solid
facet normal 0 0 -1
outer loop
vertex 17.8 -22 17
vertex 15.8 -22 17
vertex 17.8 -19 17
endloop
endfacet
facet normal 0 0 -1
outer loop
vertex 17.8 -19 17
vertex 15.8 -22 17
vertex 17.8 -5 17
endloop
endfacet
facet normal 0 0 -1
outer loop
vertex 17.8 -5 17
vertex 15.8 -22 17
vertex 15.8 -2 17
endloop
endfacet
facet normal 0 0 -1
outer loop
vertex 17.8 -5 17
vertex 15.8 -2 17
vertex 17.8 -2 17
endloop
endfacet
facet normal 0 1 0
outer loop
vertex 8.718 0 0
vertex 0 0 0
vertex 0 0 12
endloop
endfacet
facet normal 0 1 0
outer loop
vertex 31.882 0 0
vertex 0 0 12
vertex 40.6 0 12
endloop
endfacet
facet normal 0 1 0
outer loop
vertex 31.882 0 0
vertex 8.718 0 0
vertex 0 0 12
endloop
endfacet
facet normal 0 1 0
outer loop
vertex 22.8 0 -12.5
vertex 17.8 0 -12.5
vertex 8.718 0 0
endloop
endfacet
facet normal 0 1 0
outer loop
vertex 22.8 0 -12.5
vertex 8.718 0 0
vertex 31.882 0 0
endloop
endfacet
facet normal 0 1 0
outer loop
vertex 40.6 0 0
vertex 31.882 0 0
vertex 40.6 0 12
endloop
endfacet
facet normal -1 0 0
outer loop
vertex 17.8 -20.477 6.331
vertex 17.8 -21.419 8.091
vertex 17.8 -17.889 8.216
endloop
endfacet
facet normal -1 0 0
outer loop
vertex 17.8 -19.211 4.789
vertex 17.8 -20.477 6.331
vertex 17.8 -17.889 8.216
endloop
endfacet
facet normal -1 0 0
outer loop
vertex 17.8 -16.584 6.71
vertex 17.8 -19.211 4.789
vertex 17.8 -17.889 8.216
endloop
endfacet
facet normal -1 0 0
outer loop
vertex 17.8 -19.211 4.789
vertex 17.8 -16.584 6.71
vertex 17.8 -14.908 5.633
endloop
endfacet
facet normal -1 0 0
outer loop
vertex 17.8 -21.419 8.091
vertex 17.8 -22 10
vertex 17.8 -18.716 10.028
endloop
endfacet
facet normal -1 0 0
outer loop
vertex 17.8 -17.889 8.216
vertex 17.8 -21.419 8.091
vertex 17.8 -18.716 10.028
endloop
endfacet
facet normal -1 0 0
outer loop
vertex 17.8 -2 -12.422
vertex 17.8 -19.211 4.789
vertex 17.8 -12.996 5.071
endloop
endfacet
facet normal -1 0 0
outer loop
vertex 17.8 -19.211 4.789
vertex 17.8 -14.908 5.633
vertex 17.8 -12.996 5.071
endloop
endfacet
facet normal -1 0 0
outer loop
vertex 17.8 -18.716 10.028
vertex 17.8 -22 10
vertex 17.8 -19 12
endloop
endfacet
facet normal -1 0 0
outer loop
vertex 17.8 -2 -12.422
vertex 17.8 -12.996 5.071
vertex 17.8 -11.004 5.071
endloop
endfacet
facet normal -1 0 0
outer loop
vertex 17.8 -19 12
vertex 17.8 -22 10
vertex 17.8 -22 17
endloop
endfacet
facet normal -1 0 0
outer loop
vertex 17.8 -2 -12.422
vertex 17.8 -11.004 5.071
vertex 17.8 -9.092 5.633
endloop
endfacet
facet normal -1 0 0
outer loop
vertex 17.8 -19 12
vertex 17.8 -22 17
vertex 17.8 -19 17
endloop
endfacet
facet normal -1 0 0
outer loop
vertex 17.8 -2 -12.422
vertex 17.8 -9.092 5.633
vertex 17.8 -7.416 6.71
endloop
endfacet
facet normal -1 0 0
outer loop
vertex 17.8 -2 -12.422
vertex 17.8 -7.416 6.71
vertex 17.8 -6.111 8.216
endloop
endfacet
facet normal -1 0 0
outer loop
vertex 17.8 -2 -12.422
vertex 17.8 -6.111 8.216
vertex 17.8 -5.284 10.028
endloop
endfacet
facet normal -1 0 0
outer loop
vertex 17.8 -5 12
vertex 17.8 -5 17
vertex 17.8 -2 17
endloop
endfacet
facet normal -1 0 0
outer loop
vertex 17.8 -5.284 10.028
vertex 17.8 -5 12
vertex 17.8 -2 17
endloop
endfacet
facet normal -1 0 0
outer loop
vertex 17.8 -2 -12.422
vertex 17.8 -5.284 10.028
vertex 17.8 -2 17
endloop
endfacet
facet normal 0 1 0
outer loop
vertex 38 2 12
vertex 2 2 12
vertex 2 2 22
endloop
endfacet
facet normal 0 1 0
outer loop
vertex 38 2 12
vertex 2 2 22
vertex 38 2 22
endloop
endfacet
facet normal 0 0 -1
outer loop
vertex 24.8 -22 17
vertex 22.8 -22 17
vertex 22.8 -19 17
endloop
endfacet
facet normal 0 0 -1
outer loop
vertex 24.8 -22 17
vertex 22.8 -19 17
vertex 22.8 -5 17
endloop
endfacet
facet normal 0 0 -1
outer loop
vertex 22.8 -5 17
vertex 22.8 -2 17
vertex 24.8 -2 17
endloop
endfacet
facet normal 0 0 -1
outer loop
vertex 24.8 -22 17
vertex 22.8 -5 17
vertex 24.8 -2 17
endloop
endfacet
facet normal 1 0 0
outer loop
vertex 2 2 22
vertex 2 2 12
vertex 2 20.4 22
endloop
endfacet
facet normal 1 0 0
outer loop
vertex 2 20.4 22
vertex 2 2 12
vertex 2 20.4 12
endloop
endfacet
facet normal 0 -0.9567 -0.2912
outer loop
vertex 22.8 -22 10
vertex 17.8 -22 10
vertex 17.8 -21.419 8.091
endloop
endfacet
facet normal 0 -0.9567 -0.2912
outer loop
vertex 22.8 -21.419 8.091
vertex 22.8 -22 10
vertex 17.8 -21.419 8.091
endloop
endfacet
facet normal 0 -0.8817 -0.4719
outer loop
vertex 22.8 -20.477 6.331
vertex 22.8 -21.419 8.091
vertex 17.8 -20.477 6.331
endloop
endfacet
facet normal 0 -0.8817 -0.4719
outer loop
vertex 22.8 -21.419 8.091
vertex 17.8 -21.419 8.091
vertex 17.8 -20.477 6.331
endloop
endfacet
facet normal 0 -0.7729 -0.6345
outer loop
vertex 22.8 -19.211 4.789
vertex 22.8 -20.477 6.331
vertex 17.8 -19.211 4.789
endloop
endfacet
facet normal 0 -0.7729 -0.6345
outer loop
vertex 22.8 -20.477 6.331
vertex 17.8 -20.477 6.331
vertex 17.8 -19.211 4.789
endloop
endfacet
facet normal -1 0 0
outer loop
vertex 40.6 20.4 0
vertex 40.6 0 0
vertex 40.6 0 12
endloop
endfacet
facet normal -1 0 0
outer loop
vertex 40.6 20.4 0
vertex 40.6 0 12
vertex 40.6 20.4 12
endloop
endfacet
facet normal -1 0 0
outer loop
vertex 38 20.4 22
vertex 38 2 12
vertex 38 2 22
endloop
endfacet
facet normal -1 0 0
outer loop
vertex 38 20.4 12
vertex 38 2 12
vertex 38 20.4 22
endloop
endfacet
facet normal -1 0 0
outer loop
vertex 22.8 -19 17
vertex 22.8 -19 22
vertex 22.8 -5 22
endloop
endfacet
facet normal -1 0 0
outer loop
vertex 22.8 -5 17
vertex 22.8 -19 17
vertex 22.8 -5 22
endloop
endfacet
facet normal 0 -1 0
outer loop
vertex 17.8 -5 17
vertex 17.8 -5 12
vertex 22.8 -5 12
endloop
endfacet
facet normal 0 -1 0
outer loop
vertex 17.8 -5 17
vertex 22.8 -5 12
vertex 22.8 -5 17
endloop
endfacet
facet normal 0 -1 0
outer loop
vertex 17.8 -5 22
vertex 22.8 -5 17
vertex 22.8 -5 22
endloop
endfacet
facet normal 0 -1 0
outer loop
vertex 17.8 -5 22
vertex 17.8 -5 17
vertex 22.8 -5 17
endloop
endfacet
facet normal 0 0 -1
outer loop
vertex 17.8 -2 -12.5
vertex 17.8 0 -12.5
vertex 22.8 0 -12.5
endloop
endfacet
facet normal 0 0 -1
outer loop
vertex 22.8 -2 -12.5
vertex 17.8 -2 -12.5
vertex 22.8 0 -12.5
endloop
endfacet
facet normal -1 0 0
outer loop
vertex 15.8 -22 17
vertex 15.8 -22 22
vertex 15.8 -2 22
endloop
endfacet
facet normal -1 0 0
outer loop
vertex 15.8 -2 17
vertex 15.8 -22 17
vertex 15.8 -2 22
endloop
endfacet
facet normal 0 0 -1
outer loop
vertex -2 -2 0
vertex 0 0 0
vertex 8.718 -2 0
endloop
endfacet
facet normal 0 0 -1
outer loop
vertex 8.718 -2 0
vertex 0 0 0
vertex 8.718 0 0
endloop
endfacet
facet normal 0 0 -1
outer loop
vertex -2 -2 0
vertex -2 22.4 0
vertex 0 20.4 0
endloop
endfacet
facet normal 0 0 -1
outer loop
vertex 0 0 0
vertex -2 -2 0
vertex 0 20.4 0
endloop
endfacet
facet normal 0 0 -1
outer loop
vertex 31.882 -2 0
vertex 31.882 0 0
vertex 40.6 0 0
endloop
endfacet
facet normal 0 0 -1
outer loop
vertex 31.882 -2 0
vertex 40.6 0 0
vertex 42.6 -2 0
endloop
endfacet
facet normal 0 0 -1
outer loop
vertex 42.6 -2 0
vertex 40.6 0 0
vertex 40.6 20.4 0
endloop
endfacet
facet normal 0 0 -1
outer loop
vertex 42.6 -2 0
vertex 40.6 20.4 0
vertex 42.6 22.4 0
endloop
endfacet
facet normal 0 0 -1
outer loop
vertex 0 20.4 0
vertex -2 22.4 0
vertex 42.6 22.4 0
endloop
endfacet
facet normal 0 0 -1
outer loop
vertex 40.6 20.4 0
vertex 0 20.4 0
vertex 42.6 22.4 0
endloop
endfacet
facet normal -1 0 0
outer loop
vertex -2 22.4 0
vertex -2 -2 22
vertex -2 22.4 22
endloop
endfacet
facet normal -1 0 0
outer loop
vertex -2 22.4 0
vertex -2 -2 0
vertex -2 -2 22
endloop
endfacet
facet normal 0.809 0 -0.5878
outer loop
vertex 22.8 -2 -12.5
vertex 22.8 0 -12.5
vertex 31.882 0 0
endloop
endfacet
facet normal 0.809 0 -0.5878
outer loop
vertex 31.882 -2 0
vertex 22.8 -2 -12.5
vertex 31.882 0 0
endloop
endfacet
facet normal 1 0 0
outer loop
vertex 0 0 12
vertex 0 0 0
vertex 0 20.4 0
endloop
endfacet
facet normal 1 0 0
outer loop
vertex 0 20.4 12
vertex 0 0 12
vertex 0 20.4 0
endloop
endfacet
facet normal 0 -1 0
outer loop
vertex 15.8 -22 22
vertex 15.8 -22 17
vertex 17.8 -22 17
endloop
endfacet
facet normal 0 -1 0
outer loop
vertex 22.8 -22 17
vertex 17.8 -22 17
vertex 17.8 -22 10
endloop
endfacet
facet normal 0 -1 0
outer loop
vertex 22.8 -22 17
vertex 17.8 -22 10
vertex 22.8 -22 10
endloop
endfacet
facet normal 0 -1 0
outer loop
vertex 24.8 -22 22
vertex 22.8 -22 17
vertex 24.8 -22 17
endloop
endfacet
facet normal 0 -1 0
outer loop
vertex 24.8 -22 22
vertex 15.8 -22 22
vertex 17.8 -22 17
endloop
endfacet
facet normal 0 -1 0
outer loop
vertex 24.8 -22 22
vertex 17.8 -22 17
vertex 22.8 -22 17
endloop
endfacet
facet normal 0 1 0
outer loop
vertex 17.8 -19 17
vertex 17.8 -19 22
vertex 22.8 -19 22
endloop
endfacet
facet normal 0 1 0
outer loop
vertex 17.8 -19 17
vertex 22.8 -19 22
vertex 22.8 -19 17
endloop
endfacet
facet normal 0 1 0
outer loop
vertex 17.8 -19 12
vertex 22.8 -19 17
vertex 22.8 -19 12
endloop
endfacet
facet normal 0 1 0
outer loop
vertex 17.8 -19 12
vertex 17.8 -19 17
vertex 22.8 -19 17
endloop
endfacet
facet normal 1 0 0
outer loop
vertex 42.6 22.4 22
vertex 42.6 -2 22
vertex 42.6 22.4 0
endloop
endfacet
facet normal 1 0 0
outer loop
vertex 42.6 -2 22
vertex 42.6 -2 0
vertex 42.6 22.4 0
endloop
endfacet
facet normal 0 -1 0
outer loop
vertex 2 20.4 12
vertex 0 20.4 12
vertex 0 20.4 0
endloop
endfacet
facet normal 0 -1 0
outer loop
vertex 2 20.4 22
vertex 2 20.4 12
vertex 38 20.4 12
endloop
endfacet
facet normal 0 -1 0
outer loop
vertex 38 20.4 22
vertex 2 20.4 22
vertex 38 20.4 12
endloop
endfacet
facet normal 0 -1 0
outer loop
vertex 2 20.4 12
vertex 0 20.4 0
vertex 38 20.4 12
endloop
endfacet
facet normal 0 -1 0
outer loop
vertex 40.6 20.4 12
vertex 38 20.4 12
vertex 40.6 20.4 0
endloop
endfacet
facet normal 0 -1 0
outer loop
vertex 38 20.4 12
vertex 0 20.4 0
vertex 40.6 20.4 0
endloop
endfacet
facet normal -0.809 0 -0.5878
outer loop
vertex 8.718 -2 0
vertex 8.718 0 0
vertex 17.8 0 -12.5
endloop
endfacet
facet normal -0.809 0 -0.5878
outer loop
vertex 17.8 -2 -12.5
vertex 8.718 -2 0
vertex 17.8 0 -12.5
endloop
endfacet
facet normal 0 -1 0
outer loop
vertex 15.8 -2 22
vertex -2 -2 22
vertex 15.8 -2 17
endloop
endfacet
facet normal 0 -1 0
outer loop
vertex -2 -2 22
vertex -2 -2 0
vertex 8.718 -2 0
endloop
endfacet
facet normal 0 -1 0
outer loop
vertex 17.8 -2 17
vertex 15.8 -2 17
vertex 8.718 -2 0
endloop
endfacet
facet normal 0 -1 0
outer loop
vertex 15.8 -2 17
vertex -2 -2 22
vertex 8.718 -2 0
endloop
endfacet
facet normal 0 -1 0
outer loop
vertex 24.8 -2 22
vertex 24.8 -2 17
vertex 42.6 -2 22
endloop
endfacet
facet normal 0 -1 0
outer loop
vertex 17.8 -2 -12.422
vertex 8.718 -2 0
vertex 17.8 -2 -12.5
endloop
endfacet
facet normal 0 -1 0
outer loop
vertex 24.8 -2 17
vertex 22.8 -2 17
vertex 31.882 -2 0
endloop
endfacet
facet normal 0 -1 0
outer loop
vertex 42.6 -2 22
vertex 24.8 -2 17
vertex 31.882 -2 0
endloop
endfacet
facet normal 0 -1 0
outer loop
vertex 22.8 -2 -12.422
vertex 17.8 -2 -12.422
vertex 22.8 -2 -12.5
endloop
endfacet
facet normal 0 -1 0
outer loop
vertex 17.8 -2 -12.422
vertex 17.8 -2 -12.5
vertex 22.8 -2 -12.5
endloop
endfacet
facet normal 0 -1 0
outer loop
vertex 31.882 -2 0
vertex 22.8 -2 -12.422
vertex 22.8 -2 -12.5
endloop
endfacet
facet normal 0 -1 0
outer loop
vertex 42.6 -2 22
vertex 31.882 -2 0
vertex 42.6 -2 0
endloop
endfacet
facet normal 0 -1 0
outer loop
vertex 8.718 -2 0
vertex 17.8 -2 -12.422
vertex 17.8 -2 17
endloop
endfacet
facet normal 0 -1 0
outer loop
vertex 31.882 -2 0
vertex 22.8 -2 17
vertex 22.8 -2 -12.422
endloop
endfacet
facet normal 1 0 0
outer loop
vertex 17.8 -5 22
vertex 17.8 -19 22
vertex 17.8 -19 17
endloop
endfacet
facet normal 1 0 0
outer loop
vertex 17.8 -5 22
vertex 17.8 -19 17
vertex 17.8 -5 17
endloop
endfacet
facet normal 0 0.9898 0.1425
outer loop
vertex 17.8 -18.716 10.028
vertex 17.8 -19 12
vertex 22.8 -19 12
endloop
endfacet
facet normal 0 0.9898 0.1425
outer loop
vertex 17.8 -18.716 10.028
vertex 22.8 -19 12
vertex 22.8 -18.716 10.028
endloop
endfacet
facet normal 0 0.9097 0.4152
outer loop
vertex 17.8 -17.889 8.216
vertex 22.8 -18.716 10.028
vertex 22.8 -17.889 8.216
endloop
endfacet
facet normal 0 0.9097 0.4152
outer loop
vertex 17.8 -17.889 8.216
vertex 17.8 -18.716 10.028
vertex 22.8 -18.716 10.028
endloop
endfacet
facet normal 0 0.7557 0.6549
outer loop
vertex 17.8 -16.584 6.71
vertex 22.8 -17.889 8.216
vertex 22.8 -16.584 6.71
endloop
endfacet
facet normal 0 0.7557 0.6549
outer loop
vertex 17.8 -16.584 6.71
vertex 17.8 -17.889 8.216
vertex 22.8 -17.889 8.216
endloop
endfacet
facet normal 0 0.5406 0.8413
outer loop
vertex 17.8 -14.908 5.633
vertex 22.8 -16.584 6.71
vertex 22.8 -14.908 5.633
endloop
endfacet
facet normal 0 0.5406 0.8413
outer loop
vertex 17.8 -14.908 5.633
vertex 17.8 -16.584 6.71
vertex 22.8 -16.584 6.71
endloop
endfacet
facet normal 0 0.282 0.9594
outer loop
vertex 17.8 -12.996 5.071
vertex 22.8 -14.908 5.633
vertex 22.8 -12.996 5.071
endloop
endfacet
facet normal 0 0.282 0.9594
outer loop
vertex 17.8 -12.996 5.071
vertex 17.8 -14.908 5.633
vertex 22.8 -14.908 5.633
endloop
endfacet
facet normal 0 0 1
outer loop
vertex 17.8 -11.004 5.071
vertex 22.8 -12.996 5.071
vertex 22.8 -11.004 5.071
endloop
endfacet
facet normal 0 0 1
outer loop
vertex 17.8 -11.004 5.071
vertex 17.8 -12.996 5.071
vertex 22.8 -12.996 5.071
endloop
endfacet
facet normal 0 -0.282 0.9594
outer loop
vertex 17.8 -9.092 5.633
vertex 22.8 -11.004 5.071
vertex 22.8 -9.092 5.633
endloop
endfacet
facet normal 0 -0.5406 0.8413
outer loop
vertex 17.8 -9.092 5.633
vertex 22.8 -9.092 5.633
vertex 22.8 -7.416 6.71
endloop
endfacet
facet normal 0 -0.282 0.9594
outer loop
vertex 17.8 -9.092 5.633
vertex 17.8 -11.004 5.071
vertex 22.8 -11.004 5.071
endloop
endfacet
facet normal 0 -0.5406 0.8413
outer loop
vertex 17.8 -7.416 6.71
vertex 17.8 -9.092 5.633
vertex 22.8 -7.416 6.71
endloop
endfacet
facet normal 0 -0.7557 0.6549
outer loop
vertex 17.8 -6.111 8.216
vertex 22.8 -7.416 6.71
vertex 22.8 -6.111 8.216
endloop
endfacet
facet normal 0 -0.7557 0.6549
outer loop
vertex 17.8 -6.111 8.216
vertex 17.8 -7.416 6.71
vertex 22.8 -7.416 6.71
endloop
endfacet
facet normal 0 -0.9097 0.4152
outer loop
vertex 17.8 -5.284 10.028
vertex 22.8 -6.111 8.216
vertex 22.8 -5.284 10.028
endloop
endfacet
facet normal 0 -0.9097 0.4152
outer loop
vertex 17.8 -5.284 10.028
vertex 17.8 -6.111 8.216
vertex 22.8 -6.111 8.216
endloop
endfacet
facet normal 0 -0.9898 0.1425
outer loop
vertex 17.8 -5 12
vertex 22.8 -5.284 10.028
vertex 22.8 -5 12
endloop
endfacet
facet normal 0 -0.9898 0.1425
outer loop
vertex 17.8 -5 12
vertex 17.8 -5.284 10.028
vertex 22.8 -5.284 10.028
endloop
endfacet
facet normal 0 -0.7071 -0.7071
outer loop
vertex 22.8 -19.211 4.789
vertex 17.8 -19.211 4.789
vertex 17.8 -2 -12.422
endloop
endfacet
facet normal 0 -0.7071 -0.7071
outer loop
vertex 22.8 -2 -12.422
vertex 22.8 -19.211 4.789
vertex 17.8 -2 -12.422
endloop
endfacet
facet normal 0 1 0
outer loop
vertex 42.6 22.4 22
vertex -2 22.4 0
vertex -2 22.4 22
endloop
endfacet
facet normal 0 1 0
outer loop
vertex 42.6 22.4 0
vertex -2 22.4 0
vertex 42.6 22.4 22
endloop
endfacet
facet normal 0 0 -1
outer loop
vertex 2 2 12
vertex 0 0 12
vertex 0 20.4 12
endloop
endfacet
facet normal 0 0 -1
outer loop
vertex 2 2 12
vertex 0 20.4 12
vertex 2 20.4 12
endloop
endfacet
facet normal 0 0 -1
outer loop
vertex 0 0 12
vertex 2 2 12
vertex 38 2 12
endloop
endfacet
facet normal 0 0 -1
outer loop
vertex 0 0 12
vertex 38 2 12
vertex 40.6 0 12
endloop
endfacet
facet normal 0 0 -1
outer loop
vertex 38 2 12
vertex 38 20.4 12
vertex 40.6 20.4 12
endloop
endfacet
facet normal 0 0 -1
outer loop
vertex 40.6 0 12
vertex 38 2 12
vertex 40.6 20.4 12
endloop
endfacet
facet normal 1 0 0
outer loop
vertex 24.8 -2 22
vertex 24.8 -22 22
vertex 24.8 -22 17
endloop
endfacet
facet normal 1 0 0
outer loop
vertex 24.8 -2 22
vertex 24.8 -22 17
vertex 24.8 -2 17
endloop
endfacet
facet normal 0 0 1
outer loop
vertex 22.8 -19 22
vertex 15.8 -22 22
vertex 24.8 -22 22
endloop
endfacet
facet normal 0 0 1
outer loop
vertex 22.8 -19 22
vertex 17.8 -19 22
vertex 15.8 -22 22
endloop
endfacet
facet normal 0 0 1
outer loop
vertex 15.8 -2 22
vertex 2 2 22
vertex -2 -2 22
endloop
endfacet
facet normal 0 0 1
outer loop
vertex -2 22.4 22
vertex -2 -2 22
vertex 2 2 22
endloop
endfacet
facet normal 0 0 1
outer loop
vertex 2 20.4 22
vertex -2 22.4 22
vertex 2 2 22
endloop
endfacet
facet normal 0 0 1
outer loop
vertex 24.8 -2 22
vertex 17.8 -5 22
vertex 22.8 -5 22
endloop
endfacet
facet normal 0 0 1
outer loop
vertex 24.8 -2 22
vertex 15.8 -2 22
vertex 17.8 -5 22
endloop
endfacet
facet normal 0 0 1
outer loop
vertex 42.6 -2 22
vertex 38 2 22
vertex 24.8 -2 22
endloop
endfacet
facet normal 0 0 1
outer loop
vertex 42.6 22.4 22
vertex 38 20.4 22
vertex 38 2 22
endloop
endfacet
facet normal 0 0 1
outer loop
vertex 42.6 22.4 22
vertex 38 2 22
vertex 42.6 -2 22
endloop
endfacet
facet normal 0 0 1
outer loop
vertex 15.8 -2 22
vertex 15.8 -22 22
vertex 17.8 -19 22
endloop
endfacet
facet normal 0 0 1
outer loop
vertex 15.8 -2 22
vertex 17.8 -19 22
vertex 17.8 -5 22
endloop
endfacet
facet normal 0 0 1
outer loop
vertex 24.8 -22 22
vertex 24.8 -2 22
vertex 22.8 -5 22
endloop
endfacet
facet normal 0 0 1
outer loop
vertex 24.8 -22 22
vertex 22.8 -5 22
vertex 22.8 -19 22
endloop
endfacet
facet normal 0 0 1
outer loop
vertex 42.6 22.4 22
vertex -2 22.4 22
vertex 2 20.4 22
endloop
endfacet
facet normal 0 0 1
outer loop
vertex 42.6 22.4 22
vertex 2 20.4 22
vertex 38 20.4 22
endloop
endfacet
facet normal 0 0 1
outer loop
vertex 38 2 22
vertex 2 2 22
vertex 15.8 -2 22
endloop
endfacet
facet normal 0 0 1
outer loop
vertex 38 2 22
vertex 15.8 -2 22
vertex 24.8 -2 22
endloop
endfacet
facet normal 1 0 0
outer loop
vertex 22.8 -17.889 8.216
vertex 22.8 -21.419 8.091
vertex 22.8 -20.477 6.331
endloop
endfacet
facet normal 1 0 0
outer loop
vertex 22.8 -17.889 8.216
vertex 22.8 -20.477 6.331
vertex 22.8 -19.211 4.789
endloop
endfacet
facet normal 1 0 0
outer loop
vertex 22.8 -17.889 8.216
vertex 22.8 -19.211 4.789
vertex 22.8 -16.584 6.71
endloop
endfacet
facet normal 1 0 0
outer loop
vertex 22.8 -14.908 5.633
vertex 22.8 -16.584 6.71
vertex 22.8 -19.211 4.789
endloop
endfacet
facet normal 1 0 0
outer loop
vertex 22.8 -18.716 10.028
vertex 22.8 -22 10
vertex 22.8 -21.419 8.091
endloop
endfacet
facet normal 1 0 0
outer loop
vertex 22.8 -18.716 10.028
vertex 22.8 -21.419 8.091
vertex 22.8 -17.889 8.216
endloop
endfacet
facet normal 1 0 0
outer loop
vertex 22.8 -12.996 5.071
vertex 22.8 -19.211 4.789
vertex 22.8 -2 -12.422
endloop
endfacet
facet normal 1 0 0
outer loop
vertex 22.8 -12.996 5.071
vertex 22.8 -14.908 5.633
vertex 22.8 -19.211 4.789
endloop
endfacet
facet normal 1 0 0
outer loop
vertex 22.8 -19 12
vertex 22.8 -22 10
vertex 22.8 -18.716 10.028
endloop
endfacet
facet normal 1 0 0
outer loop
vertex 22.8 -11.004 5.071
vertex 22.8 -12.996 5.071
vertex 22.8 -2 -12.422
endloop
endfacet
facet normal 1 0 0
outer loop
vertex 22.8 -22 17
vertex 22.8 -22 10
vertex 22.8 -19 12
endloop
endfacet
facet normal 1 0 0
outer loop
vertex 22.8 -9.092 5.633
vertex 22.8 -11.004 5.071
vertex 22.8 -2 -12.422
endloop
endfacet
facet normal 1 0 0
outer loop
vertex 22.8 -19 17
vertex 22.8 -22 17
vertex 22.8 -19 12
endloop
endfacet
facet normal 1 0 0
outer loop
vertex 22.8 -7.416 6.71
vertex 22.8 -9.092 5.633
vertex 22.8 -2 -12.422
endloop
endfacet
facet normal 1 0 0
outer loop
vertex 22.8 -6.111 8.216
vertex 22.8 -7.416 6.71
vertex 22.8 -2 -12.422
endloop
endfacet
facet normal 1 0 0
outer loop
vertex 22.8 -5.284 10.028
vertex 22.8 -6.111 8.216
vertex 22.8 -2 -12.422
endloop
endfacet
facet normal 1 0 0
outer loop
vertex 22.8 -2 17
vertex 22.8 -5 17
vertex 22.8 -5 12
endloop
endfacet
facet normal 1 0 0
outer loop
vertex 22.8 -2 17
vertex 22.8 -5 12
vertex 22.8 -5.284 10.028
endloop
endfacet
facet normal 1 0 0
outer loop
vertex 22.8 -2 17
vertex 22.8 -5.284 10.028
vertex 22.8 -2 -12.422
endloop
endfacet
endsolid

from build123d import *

# Parameters (mm, degrees)
SKETCH002_W   = 44.6
SKETCH002_H   = 24.4
SKETCH002_W_2 = 40.6
SKETCH002_H_2 = 20.4
PAD001_DEPTH  = 12
PAD003_DEPTH  = 2
PAD_DEPTH     = 5
SKETCH005_W   = 9
SKETCH005_H   = 22
SKETCH005_W_2 = 5
SKETCH005_H_2 = 17
PAD004_DEPTH  = 5
SKETCH012_W   = 44.6
SKETCH012_H   = 24.4
SKETCH012_W_2 = 36
SKETCH012_H_2 = 18.4
PAD011_DEPTH  = 10


with BuildPart() as part:
    # Sketch002 → Pad001 (new body)
    with BuildSketch(Plane.XY):
        with Locations((20.3, 10.2)):
            Rectangle(SKETCH002_W, SKETCH002_H)
        with Locations((20.3, 10.2)):
            Rectangle(SKETCH002_W_2, SKETCH002_H_2, mode=Mode.SUBTRACT)
    extrude(amount=PAD001_DEPTH)

    # Sketch004 → Pad003 (join)
    with BuildSketch(Plane.XZ):
        Polygon((0, 12), (17.8, -12.5), (22.8, -12.5), (40.6, 12), align=None)
    extrude(amount=PAD003_DEPTH)

    # Sketch → Pad (join)
    with BuildSketch(Plane(origin=(17.8, 0, 10), x_dir=(0, 1, 0), z_dir=(1, 0, 0))):
        with BuildLine():
            Line((-22, 12), (-22, 0))
            ThreePointArc((-22, 0), (-20.991352, -2.812026), (-19.211103, -5.211103))
            Line((-19.211103, -5.211103), (-2, -22.422205))
            Line((-2, -22.422205), (-2, 2))
            Line((-2, 12), (-2, 2))
            Line((-5, 12), (-2, 12))
            Line((-5, 2), (-5, 12))
            ThreePointArc((-19, 2), (-12, -5), (-5, 2))
            Line((-19, 12), (-19, 2))
            Line((-22, 12), (-19, 12))
        make_face()
    extrude(amount=PAD_DEPTH)

    # Sketch005 → Pad004 (join)
    with BuildSketch(Plane(origin=(17.8, 0, 22), x_dir=(1, 0, 0), z_dir=(0, 0, 1))):
        with Locations((2.5, -11)):
            Rectangle(SKETCH005_W, SKETCH005_H)
        with Locations((2.5, -10.5)):
            Rectangle(SKETCH005_W_2, SKETCH005_H_2, mode=Mode.SUBTRACT)
    extrude(amount=-PAD004_DEPTH)

    # Sketch012 → Pad011 (join)
    with BuildSketch(Plane.XY.offset(12)):
        with Locations((20.3, 10.2)):
            Rectangle(SKETCH012_W, SKETCH012_H)
        with Locations((20, 11.2)):
            Rectangle(SKETCH012_W_2, SKETCH012_H_2, mode=Mode.SUBTRACT)
    extrude(amount=PAD011_DEPTH)


solid = part.part
